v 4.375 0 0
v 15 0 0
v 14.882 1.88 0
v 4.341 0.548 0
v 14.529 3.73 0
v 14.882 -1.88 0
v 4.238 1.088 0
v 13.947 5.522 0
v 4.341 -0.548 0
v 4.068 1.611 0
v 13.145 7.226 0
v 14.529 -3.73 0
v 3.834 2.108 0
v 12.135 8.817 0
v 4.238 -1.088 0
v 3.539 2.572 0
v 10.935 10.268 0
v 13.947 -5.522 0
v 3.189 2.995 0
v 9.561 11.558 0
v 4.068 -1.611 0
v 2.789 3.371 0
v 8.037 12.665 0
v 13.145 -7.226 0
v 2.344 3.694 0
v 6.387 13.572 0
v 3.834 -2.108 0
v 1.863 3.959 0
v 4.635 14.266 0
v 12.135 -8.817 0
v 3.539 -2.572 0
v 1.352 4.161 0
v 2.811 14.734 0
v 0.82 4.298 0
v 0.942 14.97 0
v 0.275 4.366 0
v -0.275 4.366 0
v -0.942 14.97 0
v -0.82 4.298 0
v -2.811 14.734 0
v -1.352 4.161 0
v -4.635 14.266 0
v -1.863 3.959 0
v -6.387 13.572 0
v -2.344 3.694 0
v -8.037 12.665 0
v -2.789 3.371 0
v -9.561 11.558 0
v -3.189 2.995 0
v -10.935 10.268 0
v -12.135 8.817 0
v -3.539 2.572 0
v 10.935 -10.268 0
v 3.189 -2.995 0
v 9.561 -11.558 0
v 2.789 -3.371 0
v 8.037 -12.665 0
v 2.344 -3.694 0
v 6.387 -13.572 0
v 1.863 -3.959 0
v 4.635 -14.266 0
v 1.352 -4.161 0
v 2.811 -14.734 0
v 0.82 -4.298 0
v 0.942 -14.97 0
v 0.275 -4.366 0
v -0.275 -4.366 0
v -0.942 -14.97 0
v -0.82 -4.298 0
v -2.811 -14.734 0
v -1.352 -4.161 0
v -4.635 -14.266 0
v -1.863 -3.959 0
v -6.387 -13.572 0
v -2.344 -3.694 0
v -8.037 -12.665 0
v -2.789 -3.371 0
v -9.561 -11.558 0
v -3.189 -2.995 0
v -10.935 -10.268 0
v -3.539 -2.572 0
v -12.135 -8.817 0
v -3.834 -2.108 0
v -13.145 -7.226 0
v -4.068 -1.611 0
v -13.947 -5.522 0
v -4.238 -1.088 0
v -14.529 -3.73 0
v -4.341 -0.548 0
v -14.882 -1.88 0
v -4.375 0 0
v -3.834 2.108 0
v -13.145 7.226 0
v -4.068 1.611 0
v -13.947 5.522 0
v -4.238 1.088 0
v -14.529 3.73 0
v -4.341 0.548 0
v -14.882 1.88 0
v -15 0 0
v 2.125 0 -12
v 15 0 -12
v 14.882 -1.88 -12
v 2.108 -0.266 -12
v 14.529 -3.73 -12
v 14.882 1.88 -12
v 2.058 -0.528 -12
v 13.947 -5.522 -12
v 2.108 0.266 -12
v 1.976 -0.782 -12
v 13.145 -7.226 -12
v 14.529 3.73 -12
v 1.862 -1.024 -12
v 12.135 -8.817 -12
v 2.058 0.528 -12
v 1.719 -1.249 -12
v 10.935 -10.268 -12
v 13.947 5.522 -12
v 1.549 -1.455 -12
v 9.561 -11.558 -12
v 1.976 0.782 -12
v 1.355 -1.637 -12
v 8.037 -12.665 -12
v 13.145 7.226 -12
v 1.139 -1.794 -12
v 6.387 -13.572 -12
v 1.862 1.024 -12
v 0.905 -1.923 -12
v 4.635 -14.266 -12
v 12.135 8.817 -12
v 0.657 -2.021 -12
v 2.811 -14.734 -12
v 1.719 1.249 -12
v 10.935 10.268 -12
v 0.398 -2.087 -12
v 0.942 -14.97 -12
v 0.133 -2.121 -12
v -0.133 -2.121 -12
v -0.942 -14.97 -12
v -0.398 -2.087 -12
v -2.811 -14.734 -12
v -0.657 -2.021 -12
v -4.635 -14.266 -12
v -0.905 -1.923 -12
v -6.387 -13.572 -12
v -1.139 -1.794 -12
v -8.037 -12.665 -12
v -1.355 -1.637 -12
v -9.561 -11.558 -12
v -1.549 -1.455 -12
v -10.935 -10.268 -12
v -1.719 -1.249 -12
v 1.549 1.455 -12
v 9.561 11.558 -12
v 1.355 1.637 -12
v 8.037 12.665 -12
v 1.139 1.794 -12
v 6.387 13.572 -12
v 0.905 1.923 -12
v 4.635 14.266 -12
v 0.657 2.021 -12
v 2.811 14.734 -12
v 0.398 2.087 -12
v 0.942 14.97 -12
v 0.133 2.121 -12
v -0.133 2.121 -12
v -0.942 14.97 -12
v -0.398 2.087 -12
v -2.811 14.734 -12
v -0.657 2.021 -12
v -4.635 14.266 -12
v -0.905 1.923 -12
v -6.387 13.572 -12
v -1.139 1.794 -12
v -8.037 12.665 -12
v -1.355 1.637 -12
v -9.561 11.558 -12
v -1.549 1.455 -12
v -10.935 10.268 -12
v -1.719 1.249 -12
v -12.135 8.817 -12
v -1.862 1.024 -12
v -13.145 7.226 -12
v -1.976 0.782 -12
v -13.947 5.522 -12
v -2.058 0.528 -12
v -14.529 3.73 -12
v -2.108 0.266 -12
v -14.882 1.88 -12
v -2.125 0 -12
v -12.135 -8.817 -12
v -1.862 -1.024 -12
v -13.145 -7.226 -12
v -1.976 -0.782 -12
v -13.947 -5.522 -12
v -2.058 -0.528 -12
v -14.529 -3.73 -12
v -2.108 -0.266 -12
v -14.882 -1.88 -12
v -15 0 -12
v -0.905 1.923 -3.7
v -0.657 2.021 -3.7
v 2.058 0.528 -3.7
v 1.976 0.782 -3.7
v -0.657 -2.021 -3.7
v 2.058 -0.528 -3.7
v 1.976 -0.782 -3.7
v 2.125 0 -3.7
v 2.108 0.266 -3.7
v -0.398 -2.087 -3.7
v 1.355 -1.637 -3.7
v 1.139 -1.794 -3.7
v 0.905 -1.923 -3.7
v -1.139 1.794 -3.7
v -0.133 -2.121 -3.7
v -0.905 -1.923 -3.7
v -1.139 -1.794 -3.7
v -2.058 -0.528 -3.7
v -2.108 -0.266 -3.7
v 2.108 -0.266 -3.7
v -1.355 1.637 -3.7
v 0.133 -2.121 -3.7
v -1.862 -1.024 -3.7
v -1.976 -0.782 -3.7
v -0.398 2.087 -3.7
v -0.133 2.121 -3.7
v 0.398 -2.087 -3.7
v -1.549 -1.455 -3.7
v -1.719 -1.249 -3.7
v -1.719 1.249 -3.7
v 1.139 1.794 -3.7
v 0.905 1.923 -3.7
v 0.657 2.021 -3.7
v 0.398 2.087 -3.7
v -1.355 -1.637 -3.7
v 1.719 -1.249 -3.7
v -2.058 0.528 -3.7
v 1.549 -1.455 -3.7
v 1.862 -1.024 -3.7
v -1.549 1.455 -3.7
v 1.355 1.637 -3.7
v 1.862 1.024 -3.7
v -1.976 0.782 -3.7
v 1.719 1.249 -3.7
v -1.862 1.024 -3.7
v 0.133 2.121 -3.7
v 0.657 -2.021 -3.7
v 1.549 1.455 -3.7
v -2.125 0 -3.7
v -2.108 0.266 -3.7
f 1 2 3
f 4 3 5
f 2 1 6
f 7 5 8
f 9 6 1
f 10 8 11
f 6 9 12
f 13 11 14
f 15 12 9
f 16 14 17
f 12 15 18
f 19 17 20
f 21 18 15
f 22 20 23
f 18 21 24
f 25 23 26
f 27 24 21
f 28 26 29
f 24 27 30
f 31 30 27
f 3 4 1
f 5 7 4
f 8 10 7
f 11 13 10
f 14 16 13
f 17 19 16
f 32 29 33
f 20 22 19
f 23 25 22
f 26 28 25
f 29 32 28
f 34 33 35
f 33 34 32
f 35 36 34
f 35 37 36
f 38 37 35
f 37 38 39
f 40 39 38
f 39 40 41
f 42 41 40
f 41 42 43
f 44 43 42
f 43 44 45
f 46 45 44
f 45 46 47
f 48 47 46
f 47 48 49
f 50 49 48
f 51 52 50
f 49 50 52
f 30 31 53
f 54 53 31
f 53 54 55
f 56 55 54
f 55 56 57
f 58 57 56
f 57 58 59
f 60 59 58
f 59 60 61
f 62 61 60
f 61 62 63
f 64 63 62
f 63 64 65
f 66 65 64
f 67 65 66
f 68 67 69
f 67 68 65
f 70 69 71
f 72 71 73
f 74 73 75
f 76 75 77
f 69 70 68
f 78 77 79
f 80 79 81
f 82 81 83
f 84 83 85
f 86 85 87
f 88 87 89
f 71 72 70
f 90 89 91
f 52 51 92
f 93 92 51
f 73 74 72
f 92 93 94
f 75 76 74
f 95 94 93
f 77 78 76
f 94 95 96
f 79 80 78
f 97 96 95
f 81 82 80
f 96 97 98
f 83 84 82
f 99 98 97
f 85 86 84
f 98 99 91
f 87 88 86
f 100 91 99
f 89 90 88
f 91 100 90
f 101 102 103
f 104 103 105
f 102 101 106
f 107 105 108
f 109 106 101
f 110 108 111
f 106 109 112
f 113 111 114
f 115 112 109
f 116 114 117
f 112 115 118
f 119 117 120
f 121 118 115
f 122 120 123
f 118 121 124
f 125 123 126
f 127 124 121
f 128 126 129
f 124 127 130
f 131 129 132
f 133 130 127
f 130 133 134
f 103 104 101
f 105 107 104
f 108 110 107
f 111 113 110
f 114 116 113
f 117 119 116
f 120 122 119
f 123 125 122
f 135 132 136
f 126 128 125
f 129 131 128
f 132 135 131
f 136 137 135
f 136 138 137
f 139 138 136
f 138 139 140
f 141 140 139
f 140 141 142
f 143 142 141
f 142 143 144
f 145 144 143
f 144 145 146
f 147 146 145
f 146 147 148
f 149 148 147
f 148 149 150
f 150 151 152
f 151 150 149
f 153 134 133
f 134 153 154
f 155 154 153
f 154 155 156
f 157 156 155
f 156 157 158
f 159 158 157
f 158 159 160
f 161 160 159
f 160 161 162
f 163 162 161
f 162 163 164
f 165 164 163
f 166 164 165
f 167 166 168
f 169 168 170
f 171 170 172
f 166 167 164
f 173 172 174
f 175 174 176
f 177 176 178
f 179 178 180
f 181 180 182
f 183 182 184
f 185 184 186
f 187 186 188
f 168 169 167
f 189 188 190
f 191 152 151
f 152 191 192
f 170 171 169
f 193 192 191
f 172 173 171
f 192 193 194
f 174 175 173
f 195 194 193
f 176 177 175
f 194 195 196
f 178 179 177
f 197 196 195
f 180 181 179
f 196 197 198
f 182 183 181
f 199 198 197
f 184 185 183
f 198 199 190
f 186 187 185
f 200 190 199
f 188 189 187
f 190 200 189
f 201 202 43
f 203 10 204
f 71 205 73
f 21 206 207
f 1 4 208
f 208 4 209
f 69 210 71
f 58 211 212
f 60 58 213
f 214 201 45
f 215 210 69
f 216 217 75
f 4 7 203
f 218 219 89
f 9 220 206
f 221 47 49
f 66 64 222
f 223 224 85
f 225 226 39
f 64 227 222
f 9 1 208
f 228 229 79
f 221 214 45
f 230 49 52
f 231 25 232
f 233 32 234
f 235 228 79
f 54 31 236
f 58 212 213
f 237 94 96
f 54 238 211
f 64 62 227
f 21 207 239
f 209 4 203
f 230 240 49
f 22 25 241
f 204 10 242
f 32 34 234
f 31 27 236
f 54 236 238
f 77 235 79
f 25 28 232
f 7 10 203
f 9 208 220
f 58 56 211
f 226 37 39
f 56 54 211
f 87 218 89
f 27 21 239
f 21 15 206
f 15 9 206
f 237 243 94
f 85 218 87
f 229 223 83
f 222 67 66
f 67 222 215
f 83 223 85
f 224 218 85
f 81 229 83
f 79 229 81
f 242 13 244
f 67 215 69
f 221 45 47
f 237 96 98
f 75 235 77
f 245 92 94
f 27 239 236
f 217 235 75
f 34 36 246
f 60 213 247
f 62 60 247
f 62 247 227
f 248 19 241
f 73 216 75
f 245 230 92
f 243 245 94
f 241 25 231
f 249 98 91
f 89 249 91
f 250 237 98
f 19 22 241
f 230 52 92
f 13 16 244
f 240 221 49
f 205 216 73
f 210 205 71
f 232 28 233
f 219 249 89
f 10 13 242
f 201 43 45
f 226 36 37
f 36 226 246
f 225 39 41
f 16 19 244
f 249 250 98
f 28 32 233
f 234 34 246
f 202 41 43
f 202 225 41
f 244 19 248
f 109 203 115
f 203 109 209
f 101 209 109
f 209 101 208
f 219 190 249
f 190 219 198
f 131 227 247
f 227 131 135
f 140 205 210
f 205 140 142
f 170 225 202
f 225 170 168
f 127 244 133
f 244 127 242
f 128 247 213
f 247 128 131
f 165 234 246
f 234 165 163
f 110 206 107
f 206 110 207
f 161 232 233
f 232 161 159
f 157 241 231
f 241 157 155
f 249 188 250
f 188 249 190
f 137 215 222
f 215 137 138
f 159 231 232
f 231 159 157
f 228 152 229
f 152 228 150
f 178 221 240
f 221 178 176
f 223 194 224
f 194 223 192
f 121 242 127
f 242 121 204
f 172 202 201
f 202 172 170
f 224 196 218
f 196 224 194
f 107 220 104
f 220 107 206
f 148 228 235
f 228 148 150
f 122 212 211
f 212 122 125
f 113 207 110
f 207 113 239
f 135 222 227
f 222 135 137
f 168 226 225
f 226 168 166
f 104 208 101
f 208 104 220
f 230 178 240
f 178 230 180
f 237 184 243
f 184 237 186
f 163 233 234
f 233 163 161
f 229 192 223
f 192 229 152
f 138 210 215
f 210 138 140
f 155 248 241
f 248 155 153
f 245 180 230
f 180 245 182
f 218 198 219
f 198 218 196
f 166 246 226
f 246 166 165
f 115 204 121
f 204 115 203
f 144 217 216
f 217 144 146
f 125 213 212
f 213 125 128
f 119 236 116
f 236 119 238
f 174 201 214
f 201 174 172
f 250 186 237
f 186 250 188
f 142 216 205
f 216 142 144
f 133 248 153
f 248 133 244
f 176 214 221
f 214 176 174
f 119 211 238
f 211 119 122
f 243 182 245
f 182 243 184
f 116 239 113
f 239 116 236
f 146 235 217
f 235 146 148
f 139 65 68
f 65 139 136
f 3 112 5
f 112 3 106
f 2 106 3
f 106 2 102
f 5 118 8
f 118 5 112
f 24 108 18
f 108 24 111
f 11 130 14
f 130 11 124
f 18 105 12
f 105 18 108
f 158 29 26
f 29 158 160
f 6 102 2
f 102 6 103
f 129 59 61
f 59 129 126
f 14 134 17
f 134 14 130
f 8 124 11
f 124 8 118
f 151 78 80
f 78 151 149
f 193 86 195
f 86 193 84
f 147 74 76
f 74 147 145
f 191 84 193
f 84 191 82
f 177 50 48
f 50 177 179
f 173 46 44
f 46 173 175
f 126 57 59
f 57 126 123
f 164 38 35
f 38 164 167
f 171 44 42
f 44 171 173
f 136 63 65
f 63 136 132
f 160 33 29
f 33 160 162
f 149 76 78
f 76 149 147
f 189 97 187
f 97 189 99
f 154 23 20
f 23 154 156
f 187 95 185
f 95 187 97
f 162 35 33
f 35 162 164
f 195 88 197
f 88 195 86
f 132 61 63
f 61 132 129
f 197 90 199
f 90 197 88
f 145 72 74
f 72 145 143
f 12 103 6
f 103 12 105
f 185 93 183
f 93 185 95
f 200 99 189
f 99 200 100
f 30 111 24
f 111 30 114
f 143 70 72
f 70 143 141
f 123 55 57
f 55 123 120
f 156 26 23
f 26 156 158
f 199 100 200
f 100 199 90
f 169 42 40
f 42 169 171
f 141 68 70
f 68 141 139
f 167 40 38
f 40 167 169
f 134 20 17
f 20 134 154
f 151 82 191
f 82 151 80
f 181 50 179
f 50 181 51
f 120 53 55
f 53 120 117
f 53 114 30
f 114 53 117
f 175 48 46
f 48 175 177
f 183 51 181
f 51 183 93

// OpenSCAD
$fn = 50;


difference() {
	union() {
		translate(v = [0, 0, -12.0000000000]) {
			cylinder(h = 12, r = 15.0000000000);
		}
	}
	union() {
		translate(v = [0, 0, 0]) {
			rotate(a = [0, 0, 0]) {
				difference() {
					union() {
						translate(v = [0, 0, -12.0000000000]) {
							cylinder(h = 12, r = 2.0000000000);
						}
						translate(v = [0, 0, -3.7000000000]) {
							cylinder(h = 3.7000000000, r1 = 2.1250000000, r2 = 4.3750000000);
						}
						translate(v = [0, 0, -12.0000000000]) {
							cylinder(h = 12, r = 2.1250000000);
						}
						translate(v = [0, 0, -12.0000000000]) {
							cylinder(h = 12, r = 2.0000000000);
						}
					}
					union();
				}
			}
		}
	}
}
